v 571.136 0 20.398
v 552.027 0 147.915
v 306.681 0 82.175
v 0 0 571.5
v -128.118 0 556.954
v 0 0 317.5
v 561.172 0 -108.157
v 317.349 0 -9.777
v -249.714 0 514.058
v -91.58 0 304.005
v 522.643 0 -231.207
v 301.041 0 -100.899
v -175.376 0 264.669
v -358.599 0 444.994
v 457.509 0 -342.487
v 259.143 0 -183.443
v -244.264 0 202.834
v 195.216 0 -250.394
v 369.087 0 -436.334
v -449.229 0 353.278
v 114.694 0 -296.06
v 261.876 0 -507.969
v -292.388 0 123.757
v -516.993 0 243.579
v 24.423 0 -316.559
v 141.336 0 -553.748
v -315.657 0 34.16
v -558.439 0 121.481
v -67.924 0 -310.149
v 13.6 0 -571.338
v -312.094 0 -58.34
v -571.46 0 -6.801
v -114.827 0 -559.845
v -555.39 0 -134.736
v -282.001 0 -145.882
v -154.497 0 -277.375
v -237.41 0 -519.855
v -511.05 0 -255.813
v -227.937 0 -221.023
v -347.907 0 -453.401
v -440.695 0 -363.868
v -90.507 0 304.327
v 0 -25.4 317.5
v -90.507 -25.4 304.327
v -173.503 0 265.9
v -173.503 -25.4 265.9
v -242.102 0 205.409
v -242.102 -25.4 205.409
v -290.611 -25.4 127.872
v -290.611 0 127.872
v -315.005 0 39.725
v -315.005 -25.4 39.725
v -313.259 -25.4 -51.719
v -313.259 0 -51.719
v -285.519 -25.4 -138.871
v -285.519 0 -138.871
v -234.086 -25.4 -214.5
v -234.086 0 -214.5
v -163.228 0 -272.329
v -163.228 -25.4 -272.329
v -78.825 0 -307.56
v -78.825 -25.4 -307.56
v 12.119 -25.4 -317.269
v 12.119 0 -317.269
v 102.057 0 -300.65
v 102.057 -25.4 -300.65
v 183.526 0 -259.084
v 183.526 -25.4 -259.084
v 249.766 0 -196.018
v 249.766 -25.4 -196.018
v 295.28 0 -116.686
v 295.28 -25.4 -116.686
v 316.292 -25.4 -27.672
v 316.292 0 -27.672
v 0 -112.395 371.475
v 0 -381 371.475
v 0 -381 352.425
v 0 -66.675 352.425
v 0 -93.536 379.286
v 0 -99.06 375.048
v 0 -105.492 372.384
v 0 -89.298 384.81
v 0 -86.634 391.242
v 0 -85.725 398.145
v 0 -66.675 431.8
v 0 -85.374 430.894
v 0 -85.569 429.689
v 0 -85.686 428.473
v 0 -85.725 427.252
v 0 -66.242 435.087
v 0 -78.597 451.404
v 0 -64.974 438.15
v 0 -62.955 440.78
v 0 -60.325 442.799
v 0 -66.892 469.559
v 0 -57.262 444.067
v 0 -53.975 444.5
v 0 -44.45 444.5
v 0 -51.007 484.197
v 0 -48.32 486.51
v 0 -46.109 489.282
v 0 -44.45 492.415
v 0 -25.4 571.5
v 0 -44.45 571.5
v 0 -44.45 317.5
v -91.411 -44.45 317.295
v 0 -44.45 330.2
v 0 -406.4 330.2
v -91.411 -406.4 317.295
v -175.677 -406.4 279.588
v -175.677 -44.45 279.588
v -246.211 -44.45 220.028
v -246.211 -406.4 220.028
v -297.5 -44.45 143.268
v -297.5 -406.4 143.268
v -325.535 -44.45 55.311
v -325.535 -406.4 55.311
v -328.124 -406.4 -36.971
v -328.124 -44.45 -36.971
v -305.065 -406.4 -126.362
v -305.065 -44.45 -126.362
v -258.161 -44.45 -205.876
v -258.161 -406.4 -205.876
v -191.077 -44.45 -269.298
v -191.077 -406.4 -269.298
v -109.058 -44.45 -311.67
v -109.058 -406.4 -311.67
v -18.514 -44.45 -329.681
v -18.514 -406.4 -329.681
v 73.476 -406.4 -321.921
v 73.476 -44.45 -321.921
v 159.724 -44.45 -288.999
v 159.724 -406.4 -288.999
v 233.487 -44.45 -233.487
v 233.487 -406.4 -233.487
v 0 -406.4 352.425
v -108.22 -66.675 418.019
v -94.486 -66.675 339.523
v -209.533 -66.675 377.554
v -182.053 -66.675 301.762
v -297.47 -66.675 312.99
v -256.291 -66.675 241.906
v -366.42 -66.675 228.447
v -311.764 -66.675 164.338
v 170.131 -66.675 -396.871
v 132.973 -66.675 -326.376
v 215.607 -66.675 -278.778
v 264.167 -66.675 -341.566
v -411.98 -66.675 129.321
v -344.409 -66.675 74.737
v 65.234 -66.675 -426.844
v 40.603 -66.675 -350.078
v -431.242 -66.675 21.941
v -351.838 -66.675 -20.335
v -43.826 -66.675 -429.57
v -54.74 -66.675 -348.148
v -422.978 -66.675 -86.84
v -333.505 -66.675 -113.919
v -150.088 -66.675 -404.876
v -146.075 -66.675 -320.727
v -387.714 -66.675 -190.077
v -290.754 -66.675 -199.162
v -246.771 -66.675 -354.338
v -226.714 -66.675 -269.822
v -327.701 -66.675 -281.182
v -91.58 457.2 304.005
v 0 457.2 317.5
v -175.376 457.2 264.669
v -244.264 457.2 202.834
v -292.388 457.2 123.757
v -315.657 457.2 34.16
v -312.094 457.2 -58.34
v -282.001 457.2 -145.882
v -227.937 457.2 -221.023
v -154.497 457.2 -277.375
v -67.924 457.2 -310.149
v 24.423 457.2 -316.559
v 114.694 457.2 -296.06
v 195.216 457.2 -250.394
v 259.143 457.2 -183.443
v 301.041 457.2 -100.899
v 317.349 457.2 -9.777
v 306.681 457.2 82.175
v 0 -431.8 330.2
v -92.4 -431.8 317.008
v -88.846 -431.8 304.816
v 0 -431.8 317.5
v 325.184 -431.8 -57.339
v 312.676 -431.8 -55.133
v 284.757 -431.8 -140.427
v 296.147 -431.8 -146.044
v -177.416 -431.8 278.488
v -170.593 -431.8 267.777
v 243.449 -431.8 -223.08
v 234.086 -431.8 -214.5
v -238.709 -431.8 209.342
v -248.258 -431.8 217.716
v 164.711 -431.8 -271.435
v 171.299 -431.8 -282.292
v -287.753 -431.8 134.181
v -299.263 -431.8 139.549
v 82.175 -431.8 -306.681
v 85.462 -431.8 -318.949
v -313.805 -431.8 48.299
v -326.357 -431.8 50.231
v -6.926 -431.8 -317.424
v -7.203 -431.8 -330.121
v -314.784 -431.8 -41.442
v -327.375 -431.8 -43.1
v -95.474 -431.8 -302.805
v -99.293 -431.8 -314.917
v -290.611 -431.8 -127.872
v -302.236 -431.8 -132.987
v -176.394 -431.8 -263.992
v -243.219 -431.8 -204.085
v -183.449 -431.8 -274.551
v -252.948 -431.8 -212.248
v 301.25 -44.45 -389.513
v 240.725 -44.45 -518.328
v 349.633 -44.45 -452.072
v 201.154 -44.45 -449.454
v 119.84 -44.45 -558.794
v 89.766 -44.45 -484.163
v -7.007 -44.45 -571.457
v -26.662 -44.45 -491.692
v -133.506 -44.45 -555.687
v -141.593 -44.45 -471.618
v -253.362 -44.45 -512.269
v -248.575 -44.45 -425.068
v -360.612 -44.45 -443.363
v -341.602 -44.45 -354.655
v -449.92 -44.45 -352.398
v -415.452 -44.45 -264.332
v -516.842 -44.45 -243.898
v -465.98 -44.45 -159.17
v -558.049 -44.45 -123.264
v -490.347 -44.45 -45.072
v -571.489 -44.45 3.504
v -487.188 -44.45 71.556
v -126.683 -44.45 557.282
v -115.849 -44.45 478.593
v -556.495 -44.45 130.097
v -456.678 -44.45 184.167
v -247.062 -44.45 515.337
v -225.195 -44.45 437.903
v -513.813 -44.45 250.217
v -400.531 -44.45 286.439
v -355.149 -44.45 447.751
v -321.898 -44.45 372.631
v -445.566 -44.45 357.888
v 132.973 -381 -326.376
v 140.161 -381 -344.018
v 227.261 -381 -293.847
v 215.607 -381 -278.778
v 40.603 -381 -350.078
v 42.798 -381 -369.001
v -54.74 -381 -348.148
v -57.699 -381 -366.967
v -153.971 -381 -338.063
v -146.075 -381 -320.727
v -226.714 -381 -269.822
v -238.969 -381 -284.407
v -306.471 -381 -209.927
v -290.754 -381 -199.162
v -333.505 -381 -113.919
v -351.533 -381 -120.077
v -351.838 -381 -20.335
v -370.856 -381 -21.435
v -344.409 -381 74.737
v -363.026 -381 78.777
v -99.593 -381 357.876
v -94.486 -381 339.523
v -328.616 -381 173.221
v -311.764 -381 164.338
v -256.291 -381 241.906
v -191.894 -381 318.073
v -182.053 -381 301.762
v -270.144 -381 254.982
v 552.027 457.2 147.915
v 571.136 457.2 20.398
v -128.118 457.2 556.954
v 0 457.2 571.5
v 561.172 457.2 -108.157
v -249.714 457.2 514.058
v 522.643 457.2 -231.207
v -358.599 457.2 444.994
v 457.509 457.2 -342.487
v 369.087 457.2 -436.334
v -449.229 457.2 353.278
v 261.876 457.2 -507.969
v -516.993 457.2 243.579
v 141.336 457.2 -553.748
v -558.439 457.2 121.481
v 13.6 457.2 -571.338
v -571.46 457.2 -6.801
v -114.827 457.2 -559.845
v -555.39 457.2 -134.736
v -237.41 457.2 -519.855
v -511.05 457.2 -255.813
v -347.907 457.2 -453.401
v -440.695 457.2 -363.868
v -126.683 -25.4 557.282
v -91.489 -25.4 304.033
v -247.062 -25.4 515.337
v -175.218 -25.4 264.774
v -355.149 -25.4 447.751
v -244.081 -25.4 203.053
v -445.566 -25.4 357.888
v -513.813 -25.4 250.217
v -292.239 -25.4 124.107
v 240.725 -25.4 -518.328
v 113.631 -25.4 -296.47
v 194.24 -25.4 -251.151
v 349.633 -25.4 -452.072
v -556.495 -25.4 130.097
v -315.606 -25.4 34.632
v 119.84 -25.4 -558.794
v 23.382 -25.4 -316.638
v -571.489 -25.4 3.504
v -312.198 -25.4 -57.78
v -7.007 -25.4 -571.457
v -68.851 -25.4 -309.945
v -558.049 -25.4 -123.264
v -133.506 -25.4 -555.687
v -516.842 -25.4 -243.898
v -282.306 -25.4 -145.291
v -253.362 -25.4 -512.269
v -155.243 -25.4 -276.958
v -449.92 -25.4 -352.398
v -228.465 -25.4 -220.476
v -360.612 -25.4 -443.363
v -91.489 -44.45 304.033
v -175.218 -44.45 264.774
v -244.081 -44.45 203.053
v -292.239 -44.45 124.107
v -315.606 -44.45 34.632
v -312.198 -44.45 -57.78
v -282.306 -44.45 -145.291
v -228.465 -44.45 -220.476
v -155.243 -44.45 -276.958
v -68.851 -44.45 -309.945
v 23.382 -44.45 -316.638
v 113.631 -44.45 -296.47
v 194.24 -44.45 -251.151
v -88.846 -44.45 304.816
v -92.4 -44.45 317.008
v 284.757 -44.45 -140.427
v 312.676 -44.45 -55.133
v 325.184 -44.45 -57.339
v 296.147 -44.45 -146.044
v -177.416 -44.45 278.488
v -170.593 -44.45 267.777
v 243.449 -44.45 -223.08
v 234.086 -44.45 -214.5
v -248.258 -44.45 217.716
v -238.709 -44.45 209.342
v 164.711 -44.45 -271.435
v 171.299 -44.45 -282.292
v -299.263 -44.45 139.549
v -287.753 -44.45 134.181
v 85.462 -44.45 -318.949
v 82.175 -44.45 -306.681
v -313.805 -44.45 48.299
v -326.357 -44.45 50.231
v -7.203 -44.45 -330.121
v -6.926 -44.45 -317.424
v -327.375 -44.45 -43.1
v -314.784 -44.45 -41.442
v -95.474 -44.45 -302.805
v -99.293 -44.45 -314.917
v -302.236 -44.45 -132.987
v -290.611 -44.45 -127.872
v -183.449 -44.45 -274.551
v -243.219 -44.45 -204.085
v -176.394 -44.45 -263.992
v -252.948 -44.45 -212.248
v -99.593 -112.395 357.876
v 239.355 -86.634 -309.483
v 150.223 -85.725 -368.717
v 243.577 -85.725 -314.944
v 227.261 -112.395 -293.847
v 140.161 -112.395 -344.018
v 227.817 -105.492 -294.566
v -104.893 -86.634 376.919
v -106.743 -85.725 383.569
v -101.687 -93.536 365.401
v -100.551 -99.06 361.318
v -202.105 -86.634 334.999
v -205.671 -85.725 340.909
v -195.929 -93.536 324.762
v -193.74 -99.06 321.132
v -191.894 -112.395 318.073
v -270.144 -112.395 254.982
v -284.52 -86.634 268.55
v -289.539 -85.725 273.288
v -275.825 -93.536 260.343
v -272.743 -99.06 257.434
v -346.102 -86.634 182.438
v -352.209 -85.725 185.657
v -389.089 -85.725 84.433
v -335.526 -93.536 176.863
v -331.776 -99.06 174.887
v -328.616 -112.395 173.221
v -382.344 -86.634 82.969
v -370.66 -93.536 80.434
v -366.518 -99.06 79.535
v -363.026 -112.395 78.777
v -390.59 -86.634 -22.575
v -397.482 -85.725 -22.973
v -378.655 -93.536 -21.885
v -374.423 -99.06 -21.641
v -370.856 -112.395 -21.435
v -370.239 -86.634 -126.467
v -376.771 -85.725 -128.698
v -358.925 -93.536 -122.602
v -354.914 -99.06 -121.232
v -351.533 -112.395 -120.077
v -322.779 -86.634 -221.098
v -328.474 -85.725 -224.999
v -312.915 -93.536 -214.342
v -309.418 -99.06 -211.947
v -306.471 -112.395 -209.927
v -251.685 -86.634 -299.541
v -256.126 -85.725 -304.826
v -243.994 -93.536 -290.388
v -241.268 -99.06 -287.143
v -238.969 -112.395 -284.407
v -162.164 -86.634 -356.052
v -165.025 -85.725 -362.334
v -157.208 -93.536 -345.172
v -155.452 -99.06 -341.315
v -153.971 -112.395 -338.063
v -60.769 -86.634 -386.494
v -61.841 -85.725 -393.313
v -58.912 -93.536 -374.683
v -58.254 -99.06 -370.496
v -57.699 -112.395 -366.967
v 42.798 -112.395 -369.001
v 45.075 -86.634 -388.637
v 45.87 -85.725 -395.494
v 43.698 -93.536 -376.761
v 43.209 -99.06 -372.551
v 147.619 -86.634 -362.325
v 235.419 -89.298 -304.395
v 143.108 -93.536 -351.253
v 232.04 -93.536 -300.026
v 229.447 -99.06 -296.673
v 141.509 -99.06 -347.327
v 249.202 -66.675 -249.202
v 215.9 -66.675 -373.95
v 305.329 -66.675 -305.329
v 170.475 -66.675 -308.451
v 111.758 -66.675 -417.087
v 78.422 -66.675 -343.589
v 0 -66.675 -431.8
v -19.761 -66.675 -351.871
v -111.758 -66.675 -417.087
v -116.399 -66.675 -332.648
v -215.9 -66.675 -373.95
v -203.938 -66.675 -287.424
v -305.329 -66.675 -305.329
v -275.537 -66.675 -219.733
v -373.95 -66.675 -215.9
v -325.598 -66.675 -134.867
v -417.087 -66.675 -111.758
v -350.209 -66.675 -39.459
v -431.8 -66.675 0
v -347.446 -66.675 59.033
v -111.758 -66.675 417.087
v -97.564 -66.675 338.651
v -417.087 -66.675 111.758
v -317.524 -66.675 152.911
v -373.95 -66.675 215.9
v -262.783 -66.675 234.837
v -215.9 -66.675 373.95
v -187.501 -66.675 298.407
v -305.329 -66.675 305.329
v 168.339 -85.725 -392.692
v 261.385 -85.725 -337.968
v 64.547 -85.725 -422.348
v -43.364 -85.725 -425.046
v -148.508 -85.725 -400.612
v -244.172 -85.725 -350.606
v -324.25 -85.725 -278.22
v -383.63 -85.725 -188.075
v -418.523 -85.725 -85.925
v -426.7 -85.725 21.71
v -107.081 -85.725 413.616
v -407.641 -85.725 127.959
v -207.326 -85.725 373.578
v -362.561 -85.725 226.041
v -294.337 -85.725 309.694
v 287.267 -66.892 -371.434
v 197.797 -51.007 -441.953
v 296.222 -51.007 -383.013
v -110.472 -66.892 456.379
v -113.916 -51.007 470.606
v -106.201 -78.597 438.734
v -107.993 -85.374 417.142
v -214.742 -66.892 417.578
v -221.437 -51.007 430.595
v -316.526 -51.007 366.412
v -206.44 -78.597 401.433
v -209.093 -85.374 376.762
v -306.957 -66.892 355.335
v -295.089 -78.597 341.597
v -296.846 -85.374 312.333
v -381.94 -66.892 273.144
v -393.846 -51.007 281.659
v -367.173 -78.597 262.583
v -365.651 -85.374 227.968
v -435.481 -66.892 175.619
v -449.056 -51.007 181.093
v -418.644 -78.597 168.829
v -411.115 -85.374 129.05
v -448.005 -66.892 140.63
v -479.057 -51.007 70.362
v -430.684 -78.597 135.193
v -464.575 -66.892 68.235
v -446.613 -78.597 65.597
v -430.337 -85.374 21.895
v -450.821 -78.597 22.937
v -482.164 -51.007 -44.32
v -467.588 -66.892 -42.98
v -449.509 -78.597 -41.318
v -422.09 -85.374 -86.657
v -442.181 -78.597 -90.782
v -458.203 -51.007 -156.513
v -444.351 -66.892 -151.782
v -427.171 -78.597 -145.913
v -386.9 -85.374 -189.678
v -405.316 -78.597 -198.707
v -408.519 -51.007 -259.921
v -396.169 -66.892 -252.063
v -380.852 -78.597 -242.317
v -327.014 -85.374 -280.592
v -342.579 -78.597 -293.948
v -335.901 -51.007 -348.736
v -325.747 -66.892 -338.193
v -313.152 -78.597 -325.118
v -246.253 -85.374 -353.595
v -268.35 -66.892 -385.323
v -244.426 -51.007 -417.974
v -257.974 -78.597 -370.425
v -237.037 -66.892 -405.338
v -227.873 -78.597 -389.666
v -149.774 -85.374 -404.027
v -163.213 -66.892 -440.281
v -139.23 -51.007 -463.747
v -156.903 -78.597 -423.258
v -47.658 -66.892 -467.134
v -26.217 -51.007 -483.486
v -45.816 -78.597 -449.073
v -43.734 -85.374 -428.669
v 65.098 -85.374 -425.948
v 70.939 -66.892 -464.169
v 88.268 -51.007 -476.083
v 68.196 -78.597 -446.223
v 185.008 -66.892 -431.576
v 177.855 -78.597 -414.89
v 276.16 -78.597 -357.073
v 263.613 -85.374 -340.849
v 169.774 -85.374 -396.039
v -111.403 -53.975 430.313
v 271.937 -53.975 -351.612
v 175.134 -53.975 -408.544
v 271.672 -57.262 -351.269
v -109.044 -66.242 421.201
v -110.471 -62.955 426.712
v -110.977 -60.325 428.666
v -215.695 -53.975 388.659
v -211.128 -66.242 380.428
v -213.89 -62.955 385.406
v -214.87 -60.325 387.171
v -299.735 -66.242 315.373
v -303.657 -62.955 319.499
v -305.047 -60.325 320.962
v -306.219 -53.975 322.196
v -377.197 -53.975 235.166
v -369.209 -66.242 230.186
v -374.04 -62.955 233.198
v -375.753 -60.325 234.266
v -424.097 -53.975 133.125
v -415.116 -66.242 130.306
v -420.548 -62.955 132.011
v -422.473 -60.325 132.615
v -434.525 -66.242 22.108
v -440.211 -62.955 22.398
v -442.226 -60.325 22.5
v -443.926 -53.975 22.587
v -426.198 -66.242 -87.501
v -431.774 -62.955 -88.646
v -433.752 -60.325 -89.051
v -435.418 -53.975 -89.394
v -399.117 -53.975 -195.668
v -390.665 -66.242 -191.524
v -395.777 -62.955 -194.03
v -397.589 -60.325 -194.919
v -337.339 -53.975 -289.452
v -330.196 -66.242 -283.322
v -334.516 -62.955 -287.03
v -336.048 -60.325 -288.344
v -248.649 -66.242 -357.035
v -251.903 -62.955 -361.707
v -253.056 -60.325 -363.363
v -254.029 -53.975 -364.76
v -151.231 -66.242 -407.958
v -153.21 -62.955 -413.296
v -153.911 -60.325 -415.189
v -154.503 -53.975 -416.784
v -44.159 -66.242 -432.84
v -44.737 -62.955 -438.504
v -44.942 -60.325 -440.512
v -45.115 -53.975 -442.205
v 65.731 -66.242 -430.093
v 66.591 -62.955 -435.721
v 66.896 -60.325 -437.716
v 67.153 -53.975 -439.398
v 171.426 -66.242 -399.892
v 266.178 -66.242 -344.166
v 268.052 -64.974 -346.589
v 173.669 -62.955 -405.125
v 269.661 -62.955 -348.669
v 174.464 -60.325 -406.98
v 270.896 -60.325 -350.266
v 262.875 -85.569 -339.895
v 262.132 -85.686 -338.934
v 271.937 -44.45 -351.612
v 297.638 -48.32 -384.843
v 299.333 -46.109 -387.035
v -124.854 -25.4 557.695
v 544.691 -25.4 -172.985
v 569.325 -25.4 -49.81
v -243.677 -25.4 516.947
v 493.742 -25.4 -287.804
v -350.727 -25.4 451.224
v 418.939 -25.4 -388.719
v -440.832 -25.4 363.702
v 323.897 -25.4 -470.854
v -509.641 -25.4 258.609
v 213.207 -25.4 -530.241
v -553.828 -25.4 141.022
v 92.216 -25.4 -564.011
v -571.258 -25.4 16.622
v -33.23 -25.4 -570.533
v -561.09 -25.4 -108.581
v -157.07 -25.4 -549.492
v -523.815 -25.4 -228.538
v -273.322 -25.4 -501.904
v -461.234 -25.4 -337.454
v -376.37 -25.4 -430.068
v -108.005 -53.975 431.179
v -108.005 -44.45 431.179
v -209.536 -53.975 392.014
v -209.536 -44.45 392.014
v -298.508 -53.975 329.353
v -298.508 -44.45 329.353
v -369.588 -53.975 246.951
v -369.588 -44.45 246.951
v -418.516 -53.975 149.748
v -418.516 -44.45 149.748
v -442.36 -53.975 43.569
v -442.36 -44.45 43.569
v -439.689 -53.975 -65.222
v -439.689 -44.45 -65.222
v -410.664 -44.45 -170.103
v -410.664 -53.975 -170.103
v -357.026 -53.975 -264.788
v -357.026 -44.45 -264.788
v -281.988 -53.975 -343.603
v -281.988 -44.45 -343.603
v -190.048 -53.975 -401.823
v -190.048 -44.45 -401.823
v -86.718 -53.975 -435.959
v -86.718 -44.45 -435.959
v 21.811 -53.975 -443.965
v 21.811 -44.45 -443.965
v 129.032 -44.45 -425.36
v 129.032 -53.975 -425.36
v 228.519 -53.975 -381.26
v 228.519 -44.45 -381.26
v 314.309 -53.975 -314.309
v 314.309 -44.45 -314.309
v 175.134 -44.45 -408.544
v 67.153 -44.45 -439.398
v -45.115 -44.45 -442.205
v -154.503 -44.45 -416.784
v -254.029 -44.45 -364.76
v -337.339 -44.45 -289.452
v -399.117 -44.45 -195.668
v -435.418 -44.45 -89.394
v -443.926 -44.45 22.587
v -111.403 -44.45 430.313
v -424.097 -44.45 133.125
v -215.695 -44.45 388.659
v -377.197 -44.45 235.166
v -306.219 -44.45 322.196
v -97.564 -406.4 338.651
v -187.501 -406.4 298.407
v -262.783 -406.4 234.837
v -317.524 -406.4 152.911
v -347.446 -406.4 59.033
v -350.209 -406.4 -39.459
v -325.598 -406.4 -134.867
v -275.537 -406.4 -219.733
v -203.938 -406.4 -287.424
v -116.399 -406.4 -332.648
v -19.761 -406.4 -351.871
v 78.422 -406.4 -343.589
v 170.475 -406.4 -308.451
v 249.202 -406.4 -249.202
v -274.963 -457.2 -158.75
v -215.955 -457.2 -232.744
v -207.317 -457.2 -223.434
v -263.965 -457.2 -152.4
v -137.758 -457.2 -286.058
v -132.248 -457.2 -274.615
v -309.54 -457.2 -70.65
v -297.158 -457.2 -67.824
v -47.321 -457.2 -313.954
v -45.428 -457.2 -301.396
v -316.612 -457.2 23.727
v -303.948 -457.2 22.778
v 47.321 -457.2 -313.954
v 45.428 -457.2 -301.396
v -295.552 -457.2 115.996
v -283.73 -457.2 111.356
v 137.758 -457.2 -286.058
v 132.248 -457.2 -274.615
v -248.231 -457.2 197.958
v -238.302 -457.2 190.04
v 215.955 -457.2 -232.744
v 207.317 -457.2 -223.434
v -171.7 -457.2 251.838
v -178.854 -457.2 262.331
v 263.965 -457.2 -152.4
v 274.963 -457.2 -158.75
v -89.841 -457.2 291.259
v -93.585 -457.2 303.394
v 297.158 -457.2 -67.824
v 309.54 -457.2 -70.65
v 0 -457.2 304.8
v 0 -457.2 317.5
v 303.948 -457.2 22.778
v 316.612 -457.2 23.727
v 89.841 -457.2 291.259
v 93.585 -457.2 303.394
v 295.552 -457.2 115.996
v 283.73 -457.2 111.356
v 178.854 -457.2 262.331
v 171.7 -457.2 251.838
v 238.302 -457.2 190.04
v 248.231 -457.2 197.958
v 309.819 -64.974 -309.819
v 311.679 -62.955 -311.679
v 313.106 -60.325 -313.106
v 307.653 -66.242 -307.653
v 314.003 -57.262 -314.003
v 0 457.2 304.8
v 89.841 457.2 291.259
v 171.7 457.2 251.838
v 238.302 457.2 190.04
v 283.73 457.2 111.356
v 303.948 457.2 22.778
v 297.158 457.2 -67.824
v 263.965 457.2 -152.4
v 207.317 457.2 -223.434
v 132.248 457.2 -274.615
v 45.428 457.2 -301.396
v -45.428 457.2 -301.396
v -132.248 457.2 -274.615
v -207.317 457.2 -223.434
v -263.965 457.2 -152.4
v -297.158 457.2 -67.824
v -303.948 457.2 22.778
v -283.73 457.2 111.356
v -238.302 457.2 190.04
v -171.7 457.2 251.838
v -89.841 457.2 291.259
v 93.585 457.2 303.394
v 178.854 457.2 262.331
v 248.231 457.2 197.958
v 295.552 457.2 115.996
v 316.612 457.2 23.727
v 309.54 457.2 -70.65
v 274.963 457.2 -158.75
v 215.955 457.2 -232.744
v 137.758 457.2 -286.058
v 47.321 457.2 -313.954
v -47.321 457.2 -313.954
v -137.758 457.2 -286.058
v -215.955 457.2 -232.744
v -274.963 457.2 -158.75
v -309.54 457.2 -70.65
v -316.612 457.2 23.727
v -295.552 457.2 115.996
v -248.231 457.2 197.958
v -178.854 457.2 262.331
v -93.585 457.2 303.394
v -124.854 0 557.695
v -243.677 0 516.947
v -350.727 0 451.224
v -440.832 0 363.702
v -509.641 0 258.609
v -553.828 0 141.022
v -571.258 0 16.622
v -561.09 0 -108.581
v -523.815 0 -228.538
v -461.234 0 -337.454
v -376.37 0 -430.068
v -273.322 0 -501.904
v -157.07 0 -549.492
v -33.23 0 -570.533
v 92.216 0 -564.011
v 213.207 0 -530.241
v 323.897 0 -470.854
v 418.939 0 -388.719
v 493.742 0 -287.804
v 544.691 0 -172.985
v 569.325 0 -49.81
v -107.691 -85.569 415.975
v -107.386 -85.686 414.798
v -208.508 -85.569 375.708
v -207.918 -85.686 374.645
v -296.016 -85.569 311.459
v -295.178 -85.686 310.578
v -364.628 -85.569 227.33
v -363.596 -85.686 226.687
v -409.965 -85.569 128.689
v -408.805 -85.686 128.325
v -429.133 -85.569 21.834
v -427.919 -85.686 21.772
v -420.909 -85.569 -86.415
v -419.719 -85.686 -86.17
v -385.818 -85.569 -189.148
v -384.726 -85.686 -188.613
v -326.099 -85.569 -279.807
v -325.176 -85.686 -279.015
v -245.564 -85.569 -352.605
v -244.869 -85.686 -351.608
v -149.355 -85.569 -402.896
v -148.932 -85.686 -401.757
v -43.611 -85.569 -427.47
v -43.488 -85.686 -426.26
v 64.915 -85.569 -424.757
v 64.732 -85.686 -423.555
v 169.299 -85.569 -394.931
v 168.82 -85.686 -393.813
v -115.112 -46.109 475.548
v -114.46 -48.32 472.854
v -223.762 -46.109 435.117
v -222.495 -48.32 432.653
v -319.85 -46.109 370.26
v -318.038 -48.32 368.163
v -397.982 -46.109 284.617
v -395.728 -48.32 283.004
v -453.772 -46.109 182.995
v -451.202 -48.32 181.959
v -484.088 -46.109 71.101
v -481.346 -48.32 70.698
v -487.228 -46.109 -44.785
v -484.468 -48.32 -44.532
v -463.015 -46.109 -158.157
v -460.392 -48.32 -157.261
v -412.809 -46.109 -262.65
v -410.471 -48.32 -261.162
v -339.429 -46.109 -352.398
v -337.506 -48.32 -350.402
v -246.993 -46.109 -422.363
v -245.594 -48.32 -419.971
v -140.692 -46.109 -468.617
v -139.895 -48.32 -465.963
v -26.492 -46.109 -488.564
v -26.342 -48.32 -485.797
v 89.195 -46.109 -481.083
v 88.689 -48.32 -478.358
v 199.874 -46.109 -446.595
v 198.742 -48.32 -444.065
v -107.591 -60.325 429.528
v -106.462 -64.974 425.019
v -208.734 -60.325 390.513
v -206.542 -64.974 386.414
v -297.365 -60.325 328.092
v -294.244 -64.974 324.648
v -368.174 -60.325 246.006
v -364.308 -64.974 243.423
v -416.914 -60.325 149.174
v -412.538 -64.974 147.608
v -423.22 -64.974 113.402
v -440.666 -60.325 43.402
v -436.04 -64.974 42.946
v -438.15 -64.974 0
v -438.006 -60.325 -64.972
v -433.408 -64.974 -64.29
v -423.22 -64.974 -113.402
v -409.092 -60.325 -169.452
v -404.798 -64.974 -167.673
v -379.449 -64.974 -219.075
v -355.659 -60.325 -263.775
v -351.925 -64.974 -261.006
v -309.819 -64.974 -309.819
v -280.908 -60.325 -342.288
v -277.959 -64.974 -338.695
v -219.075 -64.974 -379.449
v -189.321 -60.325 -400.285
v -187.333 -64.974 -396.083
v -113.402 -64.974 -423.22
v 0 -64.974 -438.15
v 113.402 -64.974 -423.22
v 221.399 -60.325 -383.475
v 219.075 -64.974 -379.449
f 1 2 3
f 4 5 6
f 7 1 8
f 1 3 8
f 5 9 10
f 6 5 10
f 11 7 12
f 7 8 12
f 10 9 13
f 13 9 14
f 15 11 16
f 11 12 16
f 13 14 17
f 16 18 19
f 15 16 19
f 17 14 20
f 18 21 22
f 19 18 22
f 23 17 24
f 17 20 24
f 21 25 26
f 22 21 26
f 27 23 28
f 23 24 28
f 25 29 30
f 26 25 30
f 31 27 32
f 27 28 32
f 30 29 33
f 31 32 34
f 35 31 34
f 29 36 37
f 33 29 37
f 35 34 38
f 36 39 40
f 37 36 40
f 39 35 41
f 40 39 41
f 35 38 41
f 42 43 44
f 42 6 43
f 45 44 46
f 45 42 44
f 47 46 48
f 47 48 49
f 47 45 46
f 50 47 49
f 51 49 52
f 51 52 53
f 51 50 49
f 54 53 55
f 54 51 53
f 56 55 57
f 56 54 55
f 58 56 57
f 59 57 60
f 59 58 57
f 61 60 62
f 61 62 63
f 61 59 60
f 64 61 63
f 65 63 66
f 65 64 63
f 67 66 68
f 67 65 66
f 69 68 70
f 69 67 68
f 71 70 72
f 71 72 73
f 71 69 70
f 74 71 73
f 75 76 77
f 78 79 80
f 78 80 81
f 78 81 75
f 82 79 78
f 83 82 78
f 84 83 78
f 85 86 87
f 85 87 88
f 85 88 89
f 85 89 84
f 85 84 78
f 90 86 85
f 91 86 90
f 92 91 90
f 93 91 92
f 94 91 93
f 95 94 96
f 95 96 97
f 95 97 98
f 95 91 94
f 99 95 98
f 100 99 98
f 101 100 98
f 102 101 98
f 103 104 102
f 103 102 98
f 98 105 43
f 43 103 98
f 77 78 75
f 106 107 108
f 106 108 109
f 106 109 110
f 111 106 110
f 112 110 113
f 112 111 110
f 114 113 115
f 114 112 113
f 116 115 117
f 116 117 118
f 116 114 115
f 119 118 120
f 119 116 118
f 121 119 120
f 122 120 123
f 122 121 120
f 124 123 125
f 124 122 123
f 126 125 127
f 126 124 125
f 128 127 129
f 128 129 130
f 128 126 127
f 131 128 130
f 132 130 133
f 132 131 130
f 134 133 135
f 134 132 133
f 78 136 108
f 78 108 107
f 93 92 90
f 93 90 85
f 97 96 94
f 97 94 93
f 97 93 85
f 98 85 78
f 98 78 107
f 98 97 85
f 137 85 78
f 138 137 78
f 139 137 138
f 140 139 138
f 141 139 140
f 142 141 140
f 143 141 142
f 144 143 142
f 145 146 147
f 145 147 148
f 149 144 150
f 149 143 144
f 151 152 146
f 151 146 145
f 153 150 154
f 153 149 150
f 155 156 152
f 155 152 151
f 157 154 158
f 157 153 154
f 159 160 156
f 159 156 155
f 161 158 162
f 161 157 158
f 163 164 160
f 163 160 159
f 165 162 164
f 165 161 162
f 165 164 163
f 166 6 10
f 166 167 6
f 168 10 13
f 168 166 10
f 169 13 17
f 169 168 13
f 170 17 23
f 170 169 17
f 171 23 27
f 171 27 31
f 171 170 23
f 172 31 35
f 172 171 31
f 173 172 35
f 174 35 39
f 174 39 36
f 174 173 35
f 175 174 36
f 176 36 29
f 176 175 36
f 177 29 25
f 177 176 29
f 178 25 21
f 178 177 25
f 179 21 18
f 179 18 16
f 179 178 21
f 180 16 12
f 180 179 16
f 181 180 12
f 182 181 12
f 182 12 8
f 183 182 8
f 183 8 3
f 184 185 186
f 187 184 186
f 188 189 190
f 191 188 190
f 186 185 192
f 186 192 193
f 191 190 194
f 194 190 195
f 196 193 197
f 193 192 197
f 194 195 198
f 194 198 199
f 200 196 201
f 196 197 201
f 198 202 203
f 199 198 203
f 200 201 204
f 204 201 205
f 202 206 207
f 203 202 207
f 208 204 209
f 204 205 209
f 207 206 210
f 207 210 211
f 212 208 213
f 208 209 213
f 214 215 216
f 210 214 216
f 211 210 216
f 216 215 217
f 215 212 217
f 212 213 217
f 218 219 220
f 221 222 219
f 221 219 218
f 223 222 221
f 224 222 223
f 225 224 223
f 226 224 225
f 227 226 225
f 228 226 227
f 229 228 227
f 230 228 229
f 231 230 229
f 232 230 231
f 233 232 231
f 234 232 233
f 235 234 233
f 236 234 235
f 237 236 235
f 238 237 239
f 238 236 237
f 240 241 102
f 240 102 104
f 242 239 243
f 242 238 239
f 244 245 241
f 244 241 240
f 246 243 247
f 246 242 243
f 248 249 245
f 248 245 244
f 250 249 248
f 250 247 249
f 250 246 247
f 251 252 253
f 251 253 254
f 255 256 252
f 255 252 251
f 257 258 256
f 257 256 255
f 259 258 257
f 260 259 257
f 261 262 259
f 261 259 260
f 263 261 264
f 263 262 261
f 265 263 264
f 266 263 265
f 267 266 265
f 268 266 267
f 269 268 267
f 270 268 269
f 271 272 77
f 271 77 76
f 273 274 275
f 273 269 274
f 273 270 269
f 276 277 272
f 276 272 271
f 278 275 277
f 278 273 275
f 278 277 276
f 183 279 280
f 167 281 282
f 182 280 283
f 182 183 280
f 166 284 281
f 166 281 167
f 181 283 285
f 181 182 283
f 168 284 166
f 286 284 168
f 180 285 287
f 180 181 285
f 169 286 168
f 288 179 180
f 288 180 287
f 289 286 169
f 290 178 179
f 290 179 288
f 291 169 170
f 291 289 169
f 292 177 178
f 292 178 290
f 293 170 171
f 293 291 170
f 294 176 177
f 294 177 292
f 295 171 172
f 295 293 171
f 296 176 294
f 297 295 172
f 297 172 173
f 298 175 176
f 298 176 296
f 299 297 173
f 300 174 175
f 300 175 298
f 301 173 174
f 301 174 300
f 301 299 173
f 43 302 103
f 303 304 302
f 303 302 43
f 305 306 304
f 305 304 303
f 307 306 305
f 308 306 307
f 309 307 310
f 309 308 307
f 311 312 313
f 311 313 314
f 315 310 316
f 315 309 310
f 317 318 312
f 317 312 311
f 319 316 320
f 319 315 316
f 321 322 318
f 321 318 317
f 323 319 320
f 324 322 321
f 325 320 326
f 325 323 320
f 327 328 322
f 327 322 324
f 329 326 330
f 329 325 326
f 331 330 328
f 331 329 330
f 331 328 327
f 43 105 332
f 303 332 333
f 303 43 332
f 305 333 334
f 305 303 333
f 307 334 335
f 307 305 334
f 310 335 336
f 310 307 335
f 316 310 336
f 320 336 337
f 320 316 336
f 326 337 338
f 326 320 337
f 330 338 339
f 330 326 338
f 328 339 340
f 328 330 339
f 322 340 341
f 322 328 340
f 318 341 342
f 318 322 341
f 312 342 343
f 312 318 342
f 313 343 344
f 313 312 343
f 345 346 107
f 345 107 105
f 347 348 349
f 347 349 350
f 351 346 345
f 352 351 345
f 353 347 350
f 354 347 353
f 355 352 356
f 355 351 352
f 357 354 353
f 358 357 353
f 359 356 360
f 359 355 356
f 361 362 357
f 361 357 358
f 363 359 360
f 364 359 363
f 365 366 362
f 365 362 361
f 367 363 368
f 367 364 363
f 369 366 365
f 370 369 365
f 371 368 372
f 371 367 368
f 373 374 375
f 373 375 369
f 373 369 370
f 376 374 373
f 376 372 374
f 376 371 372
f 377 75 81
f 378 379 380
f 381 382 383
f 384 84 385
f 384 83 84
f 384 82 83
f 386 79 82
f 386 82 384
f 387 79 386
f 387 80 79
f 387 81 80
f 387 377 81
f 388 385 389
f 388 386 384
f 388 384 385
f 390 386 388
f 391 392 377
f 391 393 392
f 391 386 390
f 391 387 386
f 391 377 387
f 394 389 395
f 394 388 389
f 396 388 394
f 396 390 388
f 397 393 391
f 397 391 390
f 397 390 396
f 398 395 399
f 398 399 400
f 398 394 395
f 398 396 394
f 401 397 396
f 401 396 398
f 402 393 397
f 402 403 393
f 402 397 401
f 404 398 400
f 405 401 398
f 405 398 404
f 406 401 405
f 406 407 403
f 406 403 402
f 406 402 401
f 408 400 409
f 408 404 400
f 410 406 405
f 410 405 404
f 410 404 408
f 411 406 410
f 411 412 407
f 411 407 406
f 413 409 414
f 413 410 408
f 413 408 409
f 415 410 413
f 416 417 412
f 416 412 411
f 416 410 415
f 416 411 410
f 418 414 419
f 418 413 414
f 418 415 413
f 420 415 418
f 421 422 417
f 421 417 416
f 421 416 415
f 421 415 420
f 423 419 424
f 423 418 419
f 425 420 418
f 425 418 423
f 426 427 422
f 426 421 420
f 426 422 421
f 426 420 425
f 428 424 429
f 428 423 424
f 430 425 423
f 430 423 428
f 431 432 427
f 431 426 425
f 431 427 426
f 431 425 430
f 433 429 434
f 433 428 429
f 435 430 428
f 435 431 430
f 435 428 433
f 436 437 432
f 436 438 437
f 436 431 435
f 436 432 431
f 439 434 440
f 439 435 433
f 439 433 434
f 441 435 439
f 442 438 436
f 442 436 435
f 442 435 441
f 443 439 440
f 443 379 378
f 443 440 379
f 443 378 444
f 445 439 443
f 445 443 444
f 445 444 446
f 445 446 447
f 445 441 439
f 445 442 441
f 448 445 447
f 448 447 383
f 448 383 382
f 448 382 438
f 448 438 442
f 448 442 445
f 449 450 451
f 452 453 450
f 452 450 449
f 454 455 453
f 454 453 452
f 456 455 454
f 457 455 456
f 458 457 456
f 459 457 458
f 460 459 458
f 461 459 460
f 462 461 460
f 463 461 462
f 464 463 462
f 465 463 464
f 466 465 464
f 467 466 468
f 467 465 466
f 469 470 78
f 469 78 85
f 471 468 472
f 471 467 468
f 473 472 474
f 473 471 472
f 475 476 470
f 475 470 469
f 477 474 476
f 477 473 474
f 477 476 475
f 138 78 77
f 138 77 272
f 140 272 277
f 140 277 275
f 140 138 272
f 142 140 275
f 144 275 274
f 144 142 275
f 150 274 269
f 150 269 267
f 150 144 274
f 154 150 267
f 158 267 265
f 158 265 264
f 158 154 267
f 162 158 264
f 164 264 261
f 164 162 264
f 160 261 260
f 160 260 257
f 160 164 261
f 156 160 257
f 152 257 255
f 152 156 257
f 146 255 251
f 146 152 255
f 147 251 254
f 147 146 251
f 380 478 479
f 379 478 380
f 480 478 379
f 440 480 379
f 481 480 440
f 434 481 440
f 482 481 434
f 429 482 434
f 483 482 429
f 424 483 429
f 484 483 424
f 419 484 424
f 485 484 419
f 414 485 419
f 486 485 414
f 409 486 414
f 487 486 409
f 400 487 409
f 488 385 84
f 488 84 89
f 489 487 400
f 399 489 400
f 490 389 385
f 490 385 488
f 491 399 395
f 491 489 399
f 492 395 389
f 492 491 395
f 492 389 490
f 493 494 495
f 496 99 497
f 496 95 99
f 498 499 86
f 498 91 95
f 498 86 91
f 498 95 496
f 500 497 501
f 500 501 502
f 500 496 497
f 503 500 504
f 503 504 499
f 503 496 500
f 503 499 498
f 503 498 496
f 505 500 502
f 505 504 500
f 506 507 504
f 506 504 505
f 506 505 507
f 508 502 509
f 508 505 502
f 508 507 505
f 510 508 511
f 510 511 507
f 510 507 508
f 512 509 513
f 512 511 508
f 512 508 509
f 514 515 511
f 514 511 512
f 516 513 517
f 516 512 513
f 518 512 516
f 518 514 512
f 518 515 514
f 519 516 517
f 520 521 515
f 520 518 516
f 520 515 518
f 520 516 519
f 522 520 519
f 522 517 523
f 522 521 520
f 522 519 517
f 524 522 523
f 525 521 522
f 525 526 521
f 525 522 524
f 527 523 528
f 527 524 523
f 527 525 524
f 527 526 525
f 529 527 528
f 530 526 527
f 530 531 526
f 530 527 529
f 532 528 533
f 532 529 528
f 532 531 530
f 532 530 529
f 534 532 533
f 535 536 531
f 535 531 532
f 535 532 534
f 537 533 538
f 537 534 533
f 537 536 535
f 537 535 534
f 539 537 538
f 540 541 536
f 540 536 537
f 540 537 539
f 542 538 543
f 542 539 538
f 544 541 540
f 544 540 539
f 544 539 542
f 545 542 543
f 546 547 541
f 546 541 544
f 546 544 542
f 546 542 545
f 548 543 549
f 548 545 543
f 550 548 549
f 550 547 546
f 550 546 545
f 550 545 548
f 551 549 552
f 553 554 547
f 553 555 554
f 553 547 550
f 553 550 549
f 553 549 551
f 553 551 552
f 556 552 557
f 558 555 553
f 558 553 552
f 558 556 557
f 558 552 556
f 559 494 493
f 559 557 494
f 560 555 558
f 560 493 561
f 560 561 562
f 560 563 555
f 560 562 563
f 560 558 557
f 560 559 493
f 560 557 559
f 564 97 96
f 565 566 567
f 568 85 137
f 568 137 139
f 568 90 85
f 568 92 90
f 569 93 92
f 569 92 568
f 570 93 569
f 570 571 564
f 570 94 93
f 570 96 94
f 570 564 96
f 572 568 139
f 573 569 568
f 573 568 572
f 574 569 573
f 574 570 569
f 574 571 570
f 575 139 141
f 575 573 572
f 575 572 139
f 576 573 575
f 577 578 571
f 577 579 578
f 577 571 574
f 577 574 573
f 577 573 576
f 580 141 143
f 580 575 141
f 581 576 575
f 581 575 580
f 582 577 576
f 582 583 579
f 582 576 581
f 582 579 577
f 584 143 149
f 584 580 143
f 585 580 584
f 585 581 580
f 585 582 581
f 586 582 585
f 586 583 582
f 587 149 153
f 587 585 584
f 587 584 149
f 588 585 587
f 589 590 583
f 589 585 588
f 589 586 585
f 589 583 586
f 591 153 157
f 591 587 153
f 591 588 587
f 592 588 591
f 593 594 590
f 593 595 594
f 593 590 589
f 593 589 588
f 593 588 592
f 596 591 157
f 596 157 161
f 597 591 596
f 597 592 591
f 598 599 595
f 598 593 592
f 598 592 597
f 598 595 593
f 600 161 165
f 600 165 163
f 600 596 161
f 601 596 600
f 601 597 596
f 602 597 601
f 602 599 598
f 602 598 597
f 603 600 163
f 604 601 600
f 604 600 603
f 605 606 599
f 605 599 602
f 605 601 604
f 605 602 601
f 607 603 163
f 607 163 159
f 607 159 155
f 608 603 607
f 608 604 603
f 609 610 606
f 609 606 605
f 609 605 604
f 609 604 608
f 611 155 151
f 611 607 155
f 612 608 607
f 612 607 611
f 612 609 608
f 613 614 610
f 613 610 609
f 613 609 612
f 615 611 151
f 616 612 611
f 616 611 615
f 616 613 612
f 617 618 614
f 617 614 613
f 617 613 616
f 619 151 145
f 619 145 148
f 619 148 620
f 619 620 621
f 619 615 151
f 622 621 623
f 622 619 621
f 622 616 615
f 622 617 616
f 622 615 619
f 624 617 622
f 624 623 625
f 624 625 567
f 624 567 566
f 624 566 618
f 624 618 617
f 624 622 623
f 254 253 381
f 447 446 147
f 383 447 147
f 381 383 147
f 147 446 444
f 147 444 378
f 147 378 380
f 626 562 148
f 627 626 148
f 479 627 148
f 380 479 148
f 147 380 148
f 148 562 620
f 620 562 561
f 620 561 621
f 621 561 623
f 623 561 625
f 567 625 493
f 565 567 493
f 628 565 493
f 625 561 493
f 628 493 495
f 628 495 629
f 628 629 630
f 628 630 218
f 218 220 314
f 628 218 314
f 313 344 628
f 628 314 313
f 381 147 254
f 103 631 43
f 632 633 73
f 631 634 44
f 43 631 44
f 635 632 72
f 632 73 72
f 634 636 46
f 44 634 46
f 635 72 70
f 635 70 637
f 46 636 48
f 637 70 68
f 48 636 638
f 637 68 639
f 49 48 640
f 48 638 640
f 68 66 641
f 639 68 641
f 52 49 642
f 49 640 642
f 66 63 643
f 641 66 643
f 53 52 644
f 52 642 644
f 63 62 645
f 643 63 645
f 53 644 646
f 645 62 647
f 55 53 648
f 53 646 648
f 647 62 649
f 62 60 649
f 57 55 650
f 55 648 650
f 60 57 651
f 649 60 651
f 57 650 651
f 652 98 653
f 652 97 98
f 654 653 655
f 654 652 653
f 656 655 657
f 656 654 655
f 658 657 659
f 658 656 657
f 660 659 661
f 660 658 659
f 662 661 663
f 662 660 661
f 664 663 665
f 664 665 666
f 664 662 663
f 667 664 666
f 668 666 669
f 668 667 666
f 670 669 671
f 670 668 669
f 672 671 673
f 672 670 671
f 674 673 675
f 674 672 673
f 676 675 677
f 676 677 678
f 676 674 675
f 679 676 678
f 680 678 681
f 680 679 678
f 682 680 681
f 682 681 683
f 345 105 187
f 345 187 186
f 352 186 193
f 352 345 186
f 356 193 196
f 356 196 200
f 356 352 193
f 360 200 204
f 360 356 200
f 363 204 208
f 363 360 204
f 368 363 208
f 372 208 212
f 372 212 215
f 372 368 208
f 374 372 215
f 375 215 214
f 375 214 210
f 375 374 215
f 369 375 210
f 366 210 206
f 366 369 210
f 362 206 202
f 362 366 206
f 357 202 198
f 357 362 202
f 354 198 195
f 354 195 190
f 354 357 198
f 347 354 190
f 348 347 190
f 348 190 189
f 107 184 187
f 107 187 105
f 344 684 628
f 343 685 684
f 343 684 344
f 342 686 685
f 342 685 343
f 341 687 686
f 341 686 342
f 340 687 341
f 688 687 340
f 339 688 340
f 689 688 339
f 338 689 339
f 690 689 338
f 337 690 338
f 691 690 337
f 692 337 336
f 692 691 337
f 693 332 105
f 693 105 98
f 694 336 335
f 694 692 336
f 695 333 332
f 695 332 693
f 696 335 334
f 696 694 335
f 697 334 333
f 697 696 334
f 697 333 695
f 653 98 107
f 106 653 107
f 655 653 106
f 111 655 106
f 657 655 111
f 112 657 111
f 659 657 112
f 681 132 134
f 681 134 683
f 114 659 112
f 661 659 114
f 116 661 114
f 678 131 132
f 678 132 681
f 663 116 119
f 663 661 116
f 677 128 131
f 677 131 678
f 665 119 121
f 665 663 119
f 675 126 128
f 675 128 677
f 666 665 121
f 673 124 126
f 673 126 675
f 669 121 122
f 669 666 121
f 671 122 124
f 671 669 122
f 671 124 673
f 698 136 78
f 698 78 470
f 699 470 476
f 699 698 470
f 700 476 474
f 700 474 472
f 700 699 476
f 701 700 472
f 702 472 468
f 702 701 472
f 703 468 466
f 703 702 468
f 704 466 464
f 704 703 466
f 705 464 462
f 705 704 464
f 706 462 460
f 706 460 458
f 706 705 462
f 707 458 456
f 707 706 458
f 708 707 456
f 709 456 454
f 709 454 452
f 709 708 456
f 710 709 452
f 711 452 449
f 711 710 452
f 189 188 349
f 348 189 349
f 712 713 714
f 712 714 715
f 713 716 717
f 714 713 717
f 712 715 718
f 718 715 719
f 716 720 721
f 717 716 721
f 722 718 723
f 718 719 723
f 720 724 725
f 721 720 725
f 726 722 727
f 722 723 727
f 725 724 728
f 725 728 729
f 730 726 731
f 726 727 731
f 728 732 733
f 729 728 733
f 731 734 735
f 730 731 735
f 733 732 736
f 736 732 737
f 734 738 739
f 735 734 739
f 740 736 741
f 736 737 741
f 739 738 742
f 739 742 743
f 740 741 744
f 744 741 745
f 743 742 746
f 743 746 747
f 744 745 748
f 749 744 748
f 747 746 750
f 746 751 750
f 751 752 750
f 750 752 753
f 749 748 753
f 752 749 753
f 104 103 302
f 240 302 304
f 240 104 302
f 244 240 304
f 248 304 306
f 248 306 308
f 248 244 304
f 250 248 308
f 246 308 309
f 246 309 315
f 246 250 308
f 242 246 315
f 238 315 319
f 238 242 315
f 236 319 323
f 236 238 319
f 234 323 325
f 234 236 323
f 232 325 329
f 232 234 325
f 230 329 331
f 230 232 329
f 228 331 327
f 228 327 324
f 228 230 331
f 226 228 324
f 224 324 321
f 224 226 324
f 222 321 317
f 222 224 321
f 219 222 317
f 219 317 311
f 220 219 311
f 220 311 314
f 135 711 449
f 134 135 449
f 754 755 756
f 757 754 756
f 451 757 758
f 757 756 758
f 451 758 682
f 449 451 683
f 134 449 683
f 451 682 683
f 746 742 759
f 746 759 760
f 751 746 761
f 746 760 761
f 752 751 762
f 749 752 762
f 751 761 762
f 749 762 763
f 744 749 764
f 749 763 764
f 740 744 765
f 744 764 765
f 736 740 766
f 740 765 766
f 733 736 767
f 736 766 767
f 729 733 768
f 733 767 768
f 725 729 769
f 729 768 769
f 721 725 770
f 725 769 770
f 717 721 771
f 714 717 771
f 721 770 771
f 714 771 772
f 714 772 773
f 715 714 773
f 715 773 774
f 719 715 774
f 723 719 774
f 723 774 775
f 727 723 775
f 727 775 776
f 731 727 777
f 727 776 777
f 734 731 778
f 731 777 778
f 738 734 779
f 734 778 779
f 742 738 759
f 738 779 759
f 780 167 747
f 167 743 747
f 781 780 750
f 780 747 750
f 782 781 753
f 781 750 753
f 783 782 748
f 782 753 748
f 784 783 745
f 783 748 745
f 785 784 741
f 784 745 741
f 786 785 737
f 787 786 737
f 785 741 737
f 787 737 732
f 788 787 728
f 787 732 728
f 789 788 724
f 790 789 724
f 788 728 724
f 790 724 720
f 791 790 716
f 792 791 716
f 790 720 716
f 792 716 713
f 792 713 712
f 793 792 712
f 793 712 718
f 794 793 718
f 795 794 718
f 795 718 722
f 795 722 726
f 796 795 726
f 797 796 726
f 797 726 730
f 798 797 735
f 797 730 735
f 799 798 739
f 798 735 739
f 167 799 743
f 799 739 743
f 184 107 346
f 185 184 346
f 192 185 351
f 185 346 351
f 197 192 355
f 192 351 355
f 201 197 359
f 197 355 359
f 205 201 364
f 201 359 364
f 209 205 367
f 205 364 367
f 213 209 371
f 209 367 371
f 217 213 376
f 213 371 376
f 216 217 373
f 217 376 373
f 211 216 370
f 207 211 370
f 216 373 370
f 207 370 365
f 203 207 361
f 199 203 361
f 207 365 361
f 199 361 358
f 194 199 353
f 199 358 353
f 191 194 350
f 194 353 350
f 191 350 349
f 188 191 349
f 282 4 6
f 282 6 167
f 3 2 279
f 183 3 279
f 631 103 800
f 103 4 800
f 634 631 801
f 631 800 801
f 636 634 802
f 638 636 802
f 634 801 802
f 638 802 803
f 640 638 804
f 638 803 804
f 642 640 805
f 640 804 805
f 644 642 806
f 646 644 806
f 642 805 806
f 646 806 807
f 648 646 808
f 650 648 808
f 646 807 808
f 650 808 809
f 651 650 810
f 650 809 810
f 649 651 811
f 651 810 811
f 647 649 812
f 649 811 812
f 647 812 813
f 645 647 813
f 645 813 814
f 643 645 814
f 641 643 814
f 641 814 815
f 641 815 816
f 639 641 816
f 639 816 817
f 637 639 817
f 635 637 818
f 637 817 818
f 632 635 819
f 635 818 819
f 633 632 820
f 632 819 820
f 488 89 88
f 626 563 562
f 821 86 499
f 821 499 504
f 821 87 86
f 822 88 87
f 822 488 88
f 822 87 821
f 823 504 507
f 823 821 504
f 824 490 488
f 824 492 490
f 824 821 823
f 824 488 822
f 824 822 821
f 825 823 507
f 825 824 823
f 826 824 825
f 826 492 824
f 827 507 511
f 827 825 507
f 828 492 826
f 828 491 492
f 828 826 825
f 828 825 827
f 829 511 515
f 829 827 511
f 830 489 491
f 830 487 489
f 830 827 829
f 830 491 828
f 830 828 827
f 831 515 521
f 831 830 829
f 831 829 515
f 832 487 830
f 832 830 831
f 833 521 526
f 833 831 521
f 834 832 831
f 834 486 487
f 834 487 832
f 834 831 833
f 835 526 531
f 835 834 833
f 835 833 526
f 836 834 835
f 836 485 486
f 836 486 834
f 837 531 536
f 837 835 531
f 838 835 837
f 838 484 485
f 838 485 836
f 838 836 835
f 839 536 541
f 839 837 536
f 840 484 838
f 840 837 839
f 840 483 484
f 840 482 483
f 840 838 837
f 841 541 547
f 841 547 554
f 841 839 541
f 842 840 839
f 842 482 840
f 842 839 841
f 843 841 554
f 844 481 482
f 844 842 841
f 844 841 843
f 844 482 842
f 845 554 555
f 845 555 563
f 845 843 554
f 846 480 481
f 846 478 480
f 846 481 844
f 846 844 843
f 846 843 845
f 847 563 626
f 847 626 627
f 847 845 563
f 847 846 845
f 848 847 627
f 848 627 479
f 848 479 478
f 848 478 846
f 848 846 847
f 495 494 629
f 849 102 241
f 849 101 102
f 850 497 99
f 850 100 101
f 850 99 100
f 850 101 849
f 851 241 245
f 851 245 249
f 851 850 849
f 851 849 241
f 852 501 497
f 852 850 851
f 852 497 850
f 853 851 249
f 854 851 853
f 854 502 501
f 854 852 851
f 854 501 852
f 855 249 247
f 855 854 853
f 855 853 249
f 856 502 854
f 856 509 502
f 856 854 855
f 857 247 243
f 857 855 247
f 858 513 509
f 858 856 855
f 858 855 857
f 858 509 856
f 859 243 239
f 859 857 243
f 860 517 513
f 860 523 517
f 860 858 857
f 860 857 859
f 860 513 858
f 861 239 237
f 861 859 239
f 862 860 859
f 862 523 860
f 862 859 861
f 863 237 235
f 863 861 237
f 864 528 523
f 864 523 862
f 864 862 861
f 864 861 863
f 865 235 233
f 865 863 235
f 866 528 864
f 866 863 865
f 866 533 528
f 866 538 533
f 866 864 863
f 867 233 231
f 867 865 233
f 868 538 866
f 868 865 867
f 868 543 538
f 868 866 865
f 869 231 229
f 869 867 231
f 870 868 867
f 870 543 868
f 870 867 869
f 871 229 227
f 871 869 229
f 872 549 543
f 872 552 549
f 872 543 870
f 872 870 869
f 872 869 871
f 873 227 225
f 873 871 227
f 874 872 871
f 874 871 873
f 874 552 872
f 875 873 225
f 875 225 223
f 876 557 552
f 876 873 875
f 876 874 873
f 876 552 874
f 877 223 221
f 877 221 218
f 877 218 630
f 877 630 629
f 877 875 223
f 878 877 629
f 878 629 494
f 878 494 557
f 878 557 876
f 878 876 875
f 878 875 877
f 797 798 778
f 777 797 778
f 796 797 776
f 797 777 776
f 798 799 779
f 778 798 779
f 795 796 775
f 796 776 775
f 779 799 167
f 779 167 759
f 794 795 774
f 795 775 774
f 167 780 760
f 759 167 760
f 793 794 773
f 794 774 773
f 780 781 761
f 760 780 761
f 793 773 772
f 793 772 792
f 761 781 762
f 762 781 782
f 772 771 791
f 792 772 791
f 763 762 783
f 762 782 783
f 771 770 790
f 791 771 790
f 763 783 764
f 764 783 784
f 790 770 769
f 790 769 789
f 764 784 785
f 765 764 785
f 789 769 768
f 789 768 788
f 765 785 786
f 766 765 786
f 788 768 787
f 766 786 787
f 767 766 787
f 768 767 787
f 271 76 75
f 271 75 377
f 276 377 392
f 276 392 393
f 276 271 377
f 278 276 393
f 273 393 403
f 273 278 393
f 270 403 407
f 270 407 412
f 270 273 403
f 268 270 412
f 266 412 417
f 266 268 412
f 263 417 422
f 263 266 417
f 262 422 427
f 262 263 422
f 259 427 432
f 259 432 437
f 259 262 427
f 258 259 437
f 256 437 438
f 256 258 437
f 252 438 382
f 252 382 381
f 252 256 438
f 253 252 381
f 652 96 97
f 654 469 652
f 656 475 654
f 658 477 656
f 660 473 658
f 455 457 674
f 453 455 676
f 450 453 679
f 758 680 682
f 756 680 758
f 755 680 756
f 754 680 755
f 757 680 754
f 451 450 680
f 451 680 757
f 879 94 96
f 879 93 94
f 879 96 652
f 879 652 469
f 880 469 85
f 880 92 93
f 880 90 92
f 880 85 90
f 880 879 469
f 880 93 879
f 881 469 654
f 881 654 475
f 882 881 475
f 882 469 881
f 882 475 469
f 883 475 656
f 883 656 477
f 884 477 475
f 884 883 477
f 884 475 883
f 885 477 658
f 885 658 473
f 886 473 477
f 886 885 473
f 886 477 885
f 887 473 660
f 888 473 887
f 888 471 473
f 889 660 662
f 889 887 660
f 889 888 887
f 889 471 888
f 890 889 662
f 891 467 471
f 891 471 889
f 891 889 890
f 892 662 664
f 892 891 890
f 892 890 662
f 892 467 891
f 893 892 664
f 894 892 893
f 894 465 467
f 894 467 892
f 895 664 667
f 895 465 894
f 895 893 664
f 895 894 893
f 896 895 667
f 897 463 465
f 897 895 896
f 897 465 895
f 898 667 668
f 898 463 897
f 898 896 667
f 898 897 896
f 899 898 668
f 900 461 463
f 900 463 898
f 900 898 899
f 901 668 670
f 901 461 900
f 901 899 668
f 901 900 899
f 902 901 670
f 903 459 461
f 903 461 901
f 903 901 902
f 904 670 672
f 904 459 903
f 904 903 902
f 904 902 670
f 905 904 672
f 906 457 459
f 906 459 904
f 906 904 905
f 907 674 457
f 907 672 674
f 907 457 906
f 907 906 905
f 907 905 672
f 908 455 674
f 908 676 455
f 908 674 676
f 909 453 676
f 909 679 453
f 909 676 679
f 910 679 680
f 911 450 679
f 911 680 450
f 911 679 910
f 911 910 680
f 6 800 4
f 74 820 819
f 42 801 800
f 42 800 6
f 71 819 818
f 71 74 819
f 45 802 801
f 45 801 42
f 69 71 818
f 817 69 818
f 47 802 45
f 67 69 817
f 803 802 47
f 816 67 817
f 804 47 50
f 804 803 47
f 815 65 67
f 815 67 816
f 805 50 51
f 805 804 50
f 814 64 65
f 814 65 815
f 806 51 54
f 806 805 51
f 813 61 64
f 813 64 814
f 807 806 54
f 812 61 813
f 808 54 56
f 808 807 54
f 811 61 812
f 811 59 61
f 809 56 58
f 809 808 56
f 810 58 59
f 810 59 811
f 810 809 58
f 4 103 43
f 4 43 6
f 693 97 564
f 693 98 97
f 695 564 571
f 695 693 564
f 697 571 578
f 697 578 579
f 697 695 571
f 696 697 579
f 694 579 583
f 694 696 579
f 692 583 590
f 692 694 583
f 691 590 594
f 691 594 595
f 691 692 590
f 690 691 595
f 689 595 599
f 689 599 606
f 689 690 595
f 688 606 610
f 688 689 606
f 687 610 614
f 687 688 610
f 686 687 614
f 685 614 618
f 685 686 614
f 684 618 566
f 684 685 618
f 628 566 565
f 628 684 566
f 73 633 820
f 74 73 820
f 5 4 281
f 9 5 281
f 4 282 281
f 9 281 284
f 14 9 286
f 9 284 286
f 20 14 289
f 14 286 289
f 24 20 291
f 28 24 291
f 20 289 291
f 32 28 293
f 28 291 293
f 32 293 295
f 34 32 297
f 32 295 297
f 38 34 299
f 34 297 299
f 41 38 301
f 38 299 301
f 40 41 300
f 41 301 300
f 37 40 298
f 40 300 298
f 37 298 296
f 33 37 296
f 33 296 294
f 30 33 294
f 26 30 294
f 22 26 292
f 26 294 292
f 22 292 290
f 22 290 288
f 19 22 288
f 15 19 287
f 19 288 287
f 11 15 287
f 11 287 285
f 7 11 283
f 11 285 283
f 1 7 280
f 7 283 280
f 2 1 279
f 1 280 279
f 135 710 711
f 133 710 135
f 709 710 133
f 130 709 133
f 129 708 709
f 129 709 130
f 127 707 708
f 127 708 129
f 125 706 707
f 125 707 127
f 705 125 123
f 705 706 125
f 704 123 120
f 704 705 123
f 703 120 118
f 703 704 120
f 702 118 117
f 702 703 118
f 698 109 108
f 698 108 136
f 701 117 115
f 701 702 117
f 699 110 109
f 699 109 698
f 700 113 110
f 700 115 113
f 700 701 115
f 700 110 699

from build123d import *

# Parameters (mm, degrees)
F0_W     = 457.2
F0_H     = 254
F2_ANGLE = 285
F0_W_2   = 25.4
F3_ANGLE = 265
F4_ANGLE = 217.7183769571
F5_ANGLE = 225
F0_W_3   = 412.75
F0_H_2   = 12.7
F6_ANGLE = 260
F7_DEPTH = 76.2
F8_DEPTH = 50.8
F9_DEPTH = 25.4


with BuildPart() as f1:
    # F0 (on Right) → F1 (revolve)
    with BuildSketch(Plane.YZ):
        Polygon((-457.2, 317.5), (-457.2, 304.8), (457.2, 304.8), (457.2, 317.5), (0, 317.5), (-25.4, 317.5), (-44.45, 317.5), align=None)
    revolve(axis=Axis((0, 0, 0), (0, 1, 0)))


with BuildPart() as f2:
    # F0 (on Right) → F2 (revolve)
    with BuildSketch(Plane.YZ):
        with Locations((228.6, 444.5)):
            Rectangle(F0_W, F0_H)
    revolve(axis=Axis((0, 0, 0), (0, -1, 0)), revolution_arc=F2_ANGLE)


with BuildPart() as f3:
    # F0 (on Right) → F3 (revolve)
    with BuildSketch(Plane.YZ):
        with Locations((-12.7, 444.5)):
            Rectangle(F0_W_2, F0_H)
    revolve(axis=Axis((0, 0, 0), (0, -1, 0)), revolution_arc=F3_ANGLE)


with BuildPart() as f4:
    # F0 (on Right) → F4 (revolve)
    with BuildSketch(Plane.YZ):
        with BuildLine():
            Line((-44.45, 330.2), (-44.45, 317.5))
            Line((-44.45, 317.5), (-25.4, 317.5))
            Line((-25.4, 317.5), (-25.4, 571.5))
            Line((-25.4, 571.5), (-44.45, 571.5))
            Line((-44.45, 571.5), (-44.45, 492.4146206836))
            ThreePointArc((-44.45, 492.4146206836), (-47.1502863313, 487.8443910671), (-51.0068258264, 484.1967002713))
            ThreePointArc((-51.0068258264, 484.1967002713), (-73.3203578572, 460.8530223268), (-85.3736820235, 430.8940772818))
            ThreePointArc((-85.3736820235, 430.8940772818), (-85.6369670993, 429.081693634), (-85.725, 427.252403136))
            Line((-85.725, 427.252403136), (-85.725, 398.145))
            ThreePointArc((-85.725, 398.145), (-93.5364621458, 379.2864621458), (-112.395, 371.475))
            Line((-112.395, 371.475), (-457.2, 371.475))
            Line((-457.2, 371.475), (-457.2, 352.425))
            Line((-457.2, 352.425), (-66.675, 352.425))
            Line((-66.675, 352.425), (-66.675, 431.8))
            ThreePointArc((-66.675, 431.8), (-62.9552561211, 440.7802561211), (-53.975, 444.5))
            Line((-53.975, 444.5), (-44.45, 444.5))
            Line((-44.45, 444.5), (-44.45, 330.2))
        make_face()
    revolve(axis=Axis((0, -457.2, 0), (0, -1, 0)), revolution_arc=F4_ANGLE)

    # F7 (cut): a face of the model
    f7_faces = [f4.faces().sort_by_distance(p)[0] for p in [
        (-342.5031197971, -457.2, -116.9925334099),
    ]]
    extrude(f7_faces, amount=-F7_DEPTH, mode=Mode.SUBTRACT)


with BuildPart() as f5:
    # F0 (on Right) → F5 (revolve)
    with BuildSketch(Plane.YZ):
        with BuildLine():
            Line((-457.2, 352.425), (-457.2, 330.2))
            Line((-457.2, 330.2), (-44.45, 330.2))
            Line((-44.45, 330.2), (-44.45, 444.5))
            Line((-44.45, 444.5), (-53.975, 444.5))
            ThreePointArc((-53.975, 444.5), (-62.9552561211, 440.7802561211), (-66.675, 431.8))
            Line((-66.675, 431.8), (-66.675, 352.425))
            Line((-66.675, 352.425), (-457.2, 352.425))
        make_face()
    revolve(axis=Axis((0, 0, 0), (0, -1, 0)), revolution_arc=F5_ANGLE)

    # F8 (cut): a face of the model
    f8_faces = [f5.faces().sort_by_distance(p)[0] for p in [
        (-317.0366735097, -457.2, -131.3208899374),
    ]]
    extrude(f8_faces, amount=-F8_DEPTH, mode=Mode.SUBTRACT)


with BuildPart() as f6:
    # F0 (on Right) → F6 (revolve)
    with BuildSketch(Plane.YZ):
        with Locations((-250.825, 323.85)):
            Rectangle(F0_W_3, F0_H_2)
    revolve(axis=Axis((0, 0, 0), (0, -1, 0)), revolution_arc=F6_ANGLE)

    # F9 (cut): a face of the model
    f9_faces = [f6.faces().sort_by_distance(p)[0] for p in [
        (-245.8205500365, -457.2, -206.2679328714),
    ]]
    extrude(f9_faces, amount=-F9_DEPTH, mode=Mode.SUBTRACT)


solid = Compound([f1.part, f2.part, f3.part, f4.part, f5.part, f6.part])
